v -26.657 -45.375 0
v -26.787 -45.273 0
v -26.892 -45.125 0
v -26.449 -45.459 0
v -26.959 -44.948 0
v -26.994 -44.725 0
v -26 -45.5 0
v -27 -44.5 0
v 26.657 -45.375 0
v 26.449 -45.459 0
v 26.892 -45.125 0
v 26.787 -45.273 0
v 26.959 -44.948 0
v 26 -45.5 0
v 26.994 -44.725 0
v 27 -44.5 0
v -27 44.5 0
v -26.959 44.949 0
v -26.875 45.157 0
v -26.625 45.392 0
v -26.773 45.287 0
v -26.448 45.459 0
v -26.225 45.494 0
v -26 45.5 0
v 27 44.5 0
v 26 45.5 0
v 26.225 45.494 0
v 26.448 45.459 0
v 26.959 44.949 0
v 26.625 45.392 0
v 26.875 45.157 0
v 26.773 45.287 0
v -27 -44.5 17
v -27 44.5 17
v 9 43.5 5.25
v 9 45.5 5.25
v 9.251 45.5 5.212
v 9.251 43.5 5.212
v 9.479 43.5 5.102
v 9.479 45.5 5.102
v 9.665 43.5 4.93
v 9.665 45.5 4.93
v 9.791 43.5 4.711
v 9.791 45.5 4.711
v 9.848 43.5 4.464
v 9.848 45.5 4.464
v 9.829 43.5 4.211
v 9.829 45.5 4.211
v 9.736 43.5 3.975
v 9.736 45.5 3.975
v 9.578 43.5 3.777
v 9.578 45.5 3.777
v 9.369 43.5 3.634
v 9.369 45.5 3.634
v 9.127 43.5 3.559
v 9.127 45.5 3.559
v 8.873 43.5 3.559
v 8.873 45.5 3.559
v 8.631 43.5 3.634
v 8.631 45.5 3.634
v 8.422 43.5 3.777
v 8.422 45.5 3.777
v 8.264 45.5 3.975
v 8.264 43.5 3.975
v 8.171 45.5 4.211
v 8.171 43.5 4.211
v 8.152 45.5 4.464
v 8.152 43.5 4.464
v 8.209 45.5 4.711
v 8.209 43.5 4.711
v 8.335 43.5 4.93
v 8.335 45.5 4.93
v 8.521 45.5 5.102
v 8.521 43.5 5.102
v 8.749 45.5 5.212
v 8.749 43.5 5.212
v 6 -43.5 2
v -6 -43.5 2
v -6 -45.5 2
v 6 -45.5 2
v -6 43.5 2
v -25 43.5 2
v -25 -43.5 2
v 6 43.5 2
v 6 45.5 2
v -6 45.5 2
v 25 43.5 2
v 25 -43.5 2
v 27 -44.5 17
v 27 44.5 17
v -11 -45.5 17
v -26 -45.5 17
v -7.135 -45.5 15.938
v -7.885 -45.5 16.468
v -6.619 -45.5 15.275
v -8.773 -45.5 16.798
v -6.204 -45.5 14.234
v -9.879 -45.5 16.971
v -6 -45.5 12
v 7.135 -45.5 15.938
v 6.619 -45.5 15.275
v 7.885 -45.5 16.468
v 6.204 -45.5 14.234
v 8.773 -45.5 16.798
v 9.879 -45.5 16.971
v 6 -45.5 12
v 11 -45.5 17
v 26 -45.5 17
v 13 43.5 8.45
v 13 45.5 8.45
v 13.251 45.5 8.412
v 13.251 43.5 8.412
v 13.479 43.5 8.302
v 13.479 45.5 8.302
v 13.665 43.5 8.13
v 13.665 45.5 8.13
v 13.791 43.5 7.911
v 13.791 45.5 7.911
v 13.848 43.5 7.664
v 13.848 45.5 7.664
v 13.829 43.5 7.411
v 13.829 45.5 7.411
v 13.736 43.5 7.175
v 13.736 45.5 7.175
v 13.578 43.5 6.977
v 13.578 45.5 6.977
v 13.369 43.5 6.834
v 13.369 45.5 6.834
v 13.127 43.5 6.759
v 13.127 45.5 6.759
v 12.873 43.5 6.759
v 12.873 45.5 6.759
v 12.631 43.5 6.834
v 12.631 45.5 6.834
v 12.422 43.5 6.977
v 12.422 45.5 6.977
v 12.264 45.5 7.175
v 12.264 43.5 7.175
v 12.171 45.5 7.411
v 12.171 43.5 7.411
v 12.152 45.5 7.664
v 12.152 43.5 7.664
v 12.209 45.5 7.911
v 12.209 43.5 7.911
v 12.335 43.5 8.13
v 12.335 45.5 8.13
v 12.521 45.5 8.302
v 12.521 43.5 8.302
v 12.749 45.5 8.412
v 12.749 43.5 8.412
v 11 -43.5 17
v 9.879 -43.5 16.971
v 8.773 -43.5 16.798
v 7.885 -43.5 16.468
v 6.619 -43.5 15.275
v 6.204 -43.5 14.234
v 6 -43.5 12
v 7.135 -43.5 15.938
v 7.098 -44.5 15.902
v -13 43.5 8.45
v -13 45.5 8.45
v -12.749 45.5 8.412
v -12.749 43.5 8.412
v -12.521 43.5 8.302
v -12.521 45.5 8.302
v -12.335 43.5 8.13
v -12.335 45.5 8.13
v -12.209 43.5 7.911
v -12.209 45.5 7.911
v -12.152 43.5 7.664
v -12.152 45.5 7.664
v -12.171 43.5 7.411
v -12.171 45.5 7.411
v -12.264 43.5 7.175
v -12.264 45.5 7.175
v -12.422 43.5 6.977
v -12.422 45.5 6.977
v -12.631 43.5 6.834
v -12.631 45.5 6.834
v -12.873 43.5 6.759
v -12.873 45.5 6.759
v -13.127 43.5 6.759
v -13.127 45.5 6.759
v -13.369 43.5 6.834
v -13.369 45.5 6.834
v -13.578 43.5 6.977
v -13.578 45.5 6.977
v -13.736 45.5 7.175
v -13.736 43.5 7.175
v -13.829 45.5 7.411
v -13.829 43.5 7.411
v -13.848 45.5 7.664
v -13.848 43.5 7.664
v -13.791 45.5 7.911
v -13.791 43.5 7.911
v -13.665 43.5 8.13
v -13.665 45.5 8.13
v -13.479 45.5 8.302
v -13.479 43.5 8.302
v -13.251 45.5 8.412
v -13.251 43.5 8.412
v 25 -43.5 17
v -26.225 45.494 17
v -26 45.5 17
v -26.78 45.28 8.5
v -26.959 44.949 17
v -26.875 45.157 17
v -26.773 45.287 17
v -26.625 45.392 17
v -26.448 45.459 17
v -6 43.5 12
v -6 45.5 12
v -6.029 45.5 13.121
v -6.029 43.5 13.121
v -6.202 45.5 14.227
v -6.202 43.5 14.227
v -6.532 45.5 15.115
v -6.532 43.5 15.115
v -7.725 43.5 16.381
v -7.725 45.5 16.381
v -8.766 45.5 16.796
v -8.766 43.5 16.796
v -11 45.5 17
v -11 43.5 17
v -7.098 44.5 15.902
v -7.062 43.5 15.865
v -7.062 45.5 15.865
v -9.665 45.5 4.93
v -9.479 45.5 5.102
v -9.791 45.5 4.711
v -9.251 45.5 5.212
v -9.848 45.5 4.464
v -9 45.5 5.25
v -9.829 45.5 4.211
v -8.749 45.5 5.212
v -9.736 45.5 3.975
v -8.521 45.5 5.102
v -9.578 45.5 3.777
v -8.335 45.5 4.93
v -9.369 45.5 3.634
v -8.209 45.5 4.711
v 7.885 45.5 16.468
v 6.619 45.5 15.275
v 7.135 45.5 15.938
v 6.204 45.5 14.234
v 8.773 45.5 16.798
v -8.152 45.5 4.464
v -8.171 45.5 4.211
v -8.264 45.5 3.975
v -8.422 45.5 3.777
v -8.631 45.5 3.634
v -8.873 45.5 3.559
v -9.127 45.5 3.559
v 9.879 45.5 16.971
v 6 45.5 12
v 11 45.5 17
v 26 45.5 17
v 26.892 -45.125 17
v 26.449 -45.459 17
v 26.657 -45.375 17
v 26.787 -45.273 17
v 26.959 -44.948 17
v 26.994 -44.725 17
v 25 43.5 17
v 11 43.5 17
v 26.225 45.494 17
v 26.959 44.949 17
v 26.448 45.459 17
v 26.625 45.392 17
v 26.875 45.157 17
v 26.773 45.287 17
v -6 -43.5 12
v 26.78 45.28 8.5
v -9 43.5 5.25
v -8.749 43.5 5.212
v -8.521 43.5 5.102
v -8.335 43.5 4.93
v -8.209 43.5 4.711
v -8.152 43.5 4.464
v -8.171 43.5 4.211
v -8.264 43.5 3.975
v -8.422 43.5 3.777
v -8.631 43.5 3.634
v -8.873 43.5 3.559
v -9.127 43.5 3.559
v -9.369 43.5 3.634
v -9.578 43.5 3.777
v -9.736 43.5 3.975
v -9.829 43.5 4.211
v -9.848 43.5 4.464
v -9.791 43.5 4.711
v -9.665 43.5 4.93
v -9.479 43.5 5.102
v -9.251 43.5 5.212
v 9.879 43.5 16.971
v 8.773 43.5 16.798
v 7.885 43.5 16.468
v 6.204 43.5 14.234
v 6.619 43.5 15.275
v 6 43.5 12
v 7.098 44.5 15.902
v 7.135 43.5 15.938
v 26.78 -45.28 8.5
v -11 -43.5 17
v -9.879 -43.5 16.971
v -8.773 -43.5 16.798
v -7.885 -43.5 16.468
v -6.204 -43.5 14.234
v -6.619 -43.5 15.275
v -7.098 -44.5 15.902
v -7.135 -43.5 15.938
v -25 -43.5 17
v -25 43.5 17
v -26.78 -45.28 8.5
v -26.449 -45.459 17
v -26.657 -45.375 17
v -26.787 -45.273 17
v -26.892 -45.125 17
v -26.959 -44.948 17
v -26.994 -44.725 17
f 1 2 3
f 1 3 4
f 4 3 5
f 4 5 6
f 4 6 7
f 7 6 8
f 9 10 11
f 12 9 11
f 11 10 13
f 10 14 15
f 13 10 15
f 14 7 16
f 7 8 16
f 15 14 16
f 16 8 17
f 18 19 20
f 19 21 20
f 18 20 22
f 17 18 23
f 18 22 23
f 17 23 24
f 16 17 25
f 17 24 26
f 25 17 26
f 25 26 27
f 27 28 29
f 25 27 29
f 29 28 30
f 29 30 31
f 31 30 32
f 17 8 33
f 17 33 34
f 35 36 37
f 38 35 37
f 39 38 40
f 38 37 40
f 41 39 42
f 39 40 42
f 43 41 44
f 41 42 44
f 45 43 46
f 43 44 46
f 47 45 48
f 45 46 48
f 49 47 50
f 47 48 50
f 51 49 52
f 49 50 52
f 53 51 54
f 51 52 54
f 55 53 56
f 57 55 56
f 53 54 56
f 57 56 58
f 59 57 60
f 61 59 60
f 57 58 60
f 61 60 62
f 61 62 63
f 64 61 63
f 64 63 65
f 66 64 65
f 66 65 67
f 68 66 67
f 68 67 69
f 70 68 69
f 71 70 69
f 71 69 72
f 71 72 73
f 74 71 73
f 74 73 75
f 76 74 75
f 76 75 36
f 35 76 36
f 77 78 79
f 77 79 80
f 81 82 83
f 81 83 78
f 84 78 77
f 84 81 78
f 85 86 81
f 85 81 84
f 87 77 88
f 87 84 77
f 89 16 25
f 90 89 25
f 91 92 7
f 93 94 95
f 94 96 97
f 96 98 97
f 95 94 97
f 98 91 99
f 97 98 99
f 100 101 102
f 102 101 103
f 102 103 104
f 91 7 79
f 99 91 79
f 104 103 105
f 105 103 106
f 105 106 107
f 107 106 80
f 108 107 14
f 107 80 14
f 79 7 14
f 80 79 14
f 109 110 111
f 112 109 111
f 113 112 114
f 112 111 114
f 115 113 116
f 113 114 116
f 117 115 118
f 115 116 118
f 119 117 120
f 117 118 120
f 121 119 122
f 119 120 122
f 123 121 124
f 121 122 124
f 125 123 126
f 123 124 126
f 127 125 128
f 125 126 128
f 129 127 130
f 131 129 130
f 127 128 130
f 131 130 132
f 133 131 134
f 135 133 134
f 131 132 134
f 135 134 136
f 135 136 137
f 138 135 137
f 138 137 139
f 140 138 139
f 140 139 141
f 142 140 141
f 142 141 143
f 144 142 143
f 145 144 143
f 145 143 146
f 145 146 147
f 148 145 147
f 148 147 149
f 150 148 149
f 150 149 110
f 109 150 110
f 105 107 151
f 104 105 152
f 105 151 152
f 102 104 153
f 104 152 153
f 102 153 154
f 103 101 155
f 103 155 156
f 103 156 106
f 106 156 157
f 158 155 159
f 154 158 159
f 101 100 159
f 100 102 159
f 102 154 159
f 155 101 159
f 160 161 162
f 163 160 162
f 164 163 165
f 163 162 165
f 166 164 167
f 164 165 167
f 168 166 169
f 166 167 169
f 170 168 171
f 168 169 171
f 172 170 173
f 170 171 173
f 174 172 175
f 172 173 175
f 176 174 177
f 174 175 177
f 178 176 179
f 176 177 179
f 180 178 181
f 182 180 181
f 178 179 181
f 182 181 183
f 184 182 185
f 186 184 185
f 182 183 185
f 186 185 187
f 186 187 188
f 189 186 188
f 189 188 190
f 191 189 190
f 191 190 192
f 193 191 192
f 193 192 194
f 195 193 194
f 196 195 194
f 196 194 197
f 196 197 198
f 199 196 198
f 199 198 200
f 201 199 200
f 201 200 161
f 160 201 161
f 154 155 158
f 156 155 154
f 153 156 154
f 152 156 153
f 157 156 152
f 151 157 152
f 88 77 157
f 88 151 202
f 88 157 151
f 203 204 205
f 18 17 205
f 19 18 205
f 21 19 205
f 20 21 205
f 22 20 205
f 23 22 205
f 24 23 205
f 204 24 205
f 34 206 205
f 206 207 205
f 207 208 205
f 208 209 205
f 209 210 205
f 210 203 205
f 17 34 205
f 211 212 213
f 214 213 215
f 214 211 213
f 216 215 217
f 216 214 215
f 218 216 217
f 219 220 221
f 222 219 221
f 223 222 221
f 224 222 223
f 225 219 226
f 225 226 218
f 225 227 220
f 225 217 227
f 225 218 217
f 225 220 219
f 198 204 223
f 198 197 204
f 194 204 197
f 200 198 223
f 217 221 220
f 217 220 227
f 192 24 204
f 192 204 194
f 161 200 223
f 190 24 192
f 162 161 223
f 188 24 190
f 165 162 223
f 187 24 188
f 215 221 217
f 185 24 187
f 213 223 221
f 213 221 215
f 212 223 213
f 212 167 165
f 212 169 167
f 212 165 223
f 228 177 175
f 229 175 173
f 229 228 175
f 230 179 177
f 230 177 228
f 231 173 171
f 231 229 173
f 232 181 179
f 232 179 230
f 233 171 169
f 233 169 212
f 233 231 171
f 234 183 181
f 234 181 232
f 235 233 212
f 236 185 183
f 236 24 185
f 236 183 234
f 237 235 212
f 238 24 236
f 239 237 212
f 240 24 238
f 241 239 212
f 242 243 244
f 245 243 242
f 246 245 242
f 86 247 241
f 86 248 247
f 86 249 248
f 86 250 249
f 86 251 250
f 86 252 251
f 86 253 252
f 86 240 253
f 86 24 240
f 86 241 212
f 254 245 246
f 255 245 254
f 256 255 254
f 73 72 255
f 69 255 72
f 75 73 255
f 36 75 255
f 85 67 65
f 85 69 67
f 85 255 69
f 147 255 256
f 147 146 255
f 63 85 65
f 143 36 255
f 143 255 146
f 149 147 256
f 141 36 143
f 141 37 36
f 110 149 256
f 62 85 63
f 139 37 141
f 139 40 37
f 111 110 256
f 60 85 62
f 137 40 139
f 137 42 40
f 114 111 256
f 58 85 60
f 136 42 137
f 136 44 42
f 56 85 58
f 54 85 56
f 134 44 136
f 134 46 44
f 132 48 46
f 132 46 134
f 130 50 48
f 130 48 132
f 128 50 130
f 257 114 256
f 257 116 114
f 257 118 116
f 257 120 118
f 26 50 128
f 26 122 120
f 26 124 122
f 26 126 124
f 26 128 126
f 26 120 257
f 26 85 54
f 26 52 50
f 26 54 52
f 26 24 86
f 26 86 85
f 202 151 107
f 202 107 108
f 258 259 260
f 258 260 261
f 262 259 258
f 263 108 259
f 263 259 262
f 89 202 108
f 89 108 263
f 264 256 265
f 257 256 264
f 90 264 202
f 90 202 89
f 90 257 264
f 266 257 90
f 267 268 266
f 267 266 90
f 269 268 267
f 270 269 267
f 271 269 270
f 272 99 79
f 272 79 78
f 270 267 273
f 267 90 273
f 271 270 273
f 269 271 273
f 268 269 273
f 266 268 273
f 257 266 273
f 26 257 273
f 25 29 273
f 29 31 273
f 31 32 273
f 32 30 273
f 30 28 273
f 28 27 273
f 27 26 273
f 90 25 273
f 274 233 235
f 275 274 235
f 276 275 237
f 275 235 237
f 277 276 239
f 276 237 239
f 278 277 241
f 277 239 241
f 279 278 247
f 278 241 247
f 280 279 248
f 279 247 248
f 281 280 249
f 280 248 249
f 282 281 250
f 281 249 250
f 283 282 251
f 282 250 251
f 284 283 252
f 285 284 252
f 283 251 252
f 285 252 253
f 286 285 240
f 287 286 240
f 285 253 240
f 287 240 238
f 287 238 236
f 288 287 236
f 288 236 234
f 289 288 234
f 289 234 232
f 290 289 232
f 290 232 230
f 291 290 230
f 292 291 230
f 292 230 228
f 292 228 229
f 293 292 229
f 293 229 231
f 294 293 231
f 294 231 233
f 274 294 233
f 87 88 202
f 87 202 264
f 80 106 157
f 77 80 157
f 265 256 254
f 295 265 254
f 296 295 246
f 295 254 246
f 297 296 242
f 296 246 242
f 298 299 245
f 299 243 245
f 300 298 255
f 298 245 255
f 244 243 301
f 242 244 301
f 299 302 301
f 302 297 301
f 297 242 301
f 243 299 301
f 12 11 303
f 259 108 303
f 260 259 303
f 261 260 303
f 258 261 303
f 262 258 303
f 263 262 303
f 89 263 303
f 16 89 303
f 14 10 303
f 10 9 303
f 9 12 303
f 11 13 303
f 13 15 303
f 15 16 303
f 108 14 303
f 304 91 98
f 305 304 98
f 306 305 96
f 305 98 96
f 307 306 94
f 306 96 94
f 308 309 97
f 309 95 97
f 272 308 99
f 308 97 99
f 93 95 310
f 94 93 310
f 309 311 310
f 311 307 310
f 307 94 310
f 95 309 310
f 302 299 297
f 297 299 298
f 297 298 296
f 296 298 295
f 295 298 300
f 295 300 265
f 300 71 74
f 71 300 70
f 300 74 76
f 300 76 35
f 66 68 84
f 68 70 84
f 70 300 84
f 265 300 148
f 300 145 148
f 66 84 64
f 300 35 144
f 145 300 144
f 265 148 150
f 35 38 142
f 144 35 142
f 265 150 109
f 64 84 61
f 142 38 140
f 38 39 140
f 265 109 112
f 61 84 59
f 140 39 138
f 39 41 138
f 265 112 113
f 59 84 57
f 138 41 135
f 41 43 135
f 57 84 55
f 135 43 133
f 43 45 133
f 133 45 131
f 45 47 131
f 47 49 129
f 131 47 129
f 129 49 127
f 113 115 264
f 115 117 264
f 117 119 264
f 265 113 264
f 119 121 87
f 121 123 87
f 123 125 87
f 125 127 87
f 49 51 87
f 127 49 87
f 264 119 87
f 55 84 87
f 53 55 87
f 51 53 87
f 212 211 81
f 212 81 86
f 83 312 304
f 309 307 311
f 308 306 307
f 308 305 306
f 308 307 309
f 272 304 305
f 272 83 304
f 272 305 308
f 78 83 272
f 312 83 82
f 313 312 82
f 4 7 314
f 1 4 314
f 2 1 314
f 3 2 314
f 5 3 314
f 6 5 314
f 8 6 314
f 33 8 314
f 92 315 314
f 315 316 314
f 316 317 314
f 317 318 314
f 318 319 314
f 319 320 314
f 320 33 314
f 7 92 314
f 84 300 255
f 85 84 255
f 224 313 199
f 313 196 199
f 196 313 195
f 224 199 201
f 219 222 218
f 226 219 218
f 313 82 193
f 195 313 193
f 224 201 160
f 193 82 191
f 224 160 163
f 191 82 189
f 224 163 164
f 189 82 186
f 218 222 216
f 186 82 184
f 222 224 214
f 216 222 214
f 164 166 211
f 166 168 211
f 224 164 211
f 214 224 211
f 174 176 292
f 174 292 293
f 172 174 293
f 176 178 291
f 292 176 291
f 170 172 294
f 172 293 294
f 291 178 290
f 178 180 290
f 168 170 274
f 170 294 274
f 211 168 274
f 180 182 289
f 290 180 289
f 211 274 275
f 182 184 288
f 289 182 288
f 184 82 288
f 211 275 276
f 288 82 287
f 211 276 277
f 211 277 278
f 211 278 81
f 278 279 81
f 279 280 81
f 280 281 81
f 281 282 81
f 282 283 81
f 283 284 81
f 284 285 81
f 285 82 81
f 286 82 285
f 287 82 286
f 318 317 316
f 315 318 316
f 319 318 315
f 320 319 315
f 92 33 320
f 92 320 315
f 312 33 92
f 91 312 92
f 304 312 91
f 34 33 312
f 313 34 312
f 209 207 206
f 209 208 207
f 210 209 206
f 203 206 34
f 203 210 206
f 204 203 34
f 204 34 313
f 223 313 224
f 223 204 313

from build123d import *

# Parameters (mm, degrees)
SKETCH_1_W          = 54
SKETCH_1_H          = 91
SKETCH_1_W_2        = 50
SKETCH_1_H_2        = 87
EXTRUDE_1_DEPTH     = 17
SKETCH_2_W          = 54
SKETCH_2_H          = 91
EXTRUDE_2_DEPTH     = 2
SKETCH_3_W          = 12
SKETCH_3_H          = 98.630911944
CUT_EXTRUDE_1_DEPTH = 15
SKETCH_5_R          = 0.85
CUT_EXTRUDE_2_DEPTH = 11
FILLET_1_SIZE       = 1
FILLET_2_SIZE       = 5


with BuildPart() as part:
    # 草图1 → 凸台-拉伸1 (new body)
    with BuildSketch(Plane.XY):
        Rectangle(SKETCH_1_W, SKETCH_1_H)
        Rectangle(SKETCH_1_W_2, SKETCH_1_H_2, mode=Mode.SUBTRACT)
    extrude(amount=EXTRUDE_1_DEPTH)

    # 草图2 → 凸台-拉伸2 (add)
    with BuildSketch(Plane(origin=(0, 0, 0), x_dir=(-1, 0, 0), z_dir=(0, 0, -1))):
        Rectangle(SKETCH_2_W, SKETCH_2_H)
    extrude(amount=-EXTRUDE_2_DEPTH)

    # 草图3 → 切除-拉伸1 (cut)
    with BuildSketch(Plane.XY.offset(17)):
        Rectangle(SKETCH_3_W, SKETCH_3_H)
    extrude(amount=-CUT_EXTRUDE_1_DEPTH, mode=Mode.SUBTRACT)

    # 草图5 → 切除-拉伸2 (cut)
    with BuildSketch(Plane(origin=(0, 45.5, 0), x_dir=(1, 0, 0), z_dir=(0, 1, 0))):
        with Locations(Location((-9, -4.4, 0), (0, 0, 270))):
            Circle(SKETCH_5_R)
        with Locations(Location((-13, -7.6, 0), (0, 0, 270))):
            Circle(SKETCH_5_R)
        with Locations(Location((9, -4.4, 0), (0, 0, 270))):
            Circle(SKETCH_5_R)
        with Locations(Location((13, -7.6, 0), (0, 0, 270))):
            Circle(SKETCH_5_R)
    extrude(amount=-CUT_EXTRUDE_2_DEPTH, mode=Mode.SUBTRACT)

    # 圆角1
    # a fillet whose section is not a circle: 1 mm, written as the material it takes off along each edge
    with BuildSketch(Plane(origin=(-27, -45.5, -2.5), x_dir=(0, 1, 0), z_dir=(0, 0, 1)), Plane(origin=(27, -45.5, 19.5), x_dir=(0, 1, 0), z_dir=(0, 0, -1)), Plane(origin=(27, 45.5, 19.5), x_dir=(-1, 0, 0), z_dir=(0, 0, -1)), Plane(origin=(-27, 45.5, -2.5), x_dir=(1, 0, 0), z_dir=(0, 0, 1))) as fillet_1_piece_1:
        with BuildLine():
            add(Edge.make_bspline([(FILLET_1_SIZE, 0), (FILLET_1_SIZE * 0.831801948466, 0), (FILLET_1_SIZE * 0.663603896932, 0), (FILLET_1_SIZE * 0.292893218813, -FILLET_1_SIZE * 0.0716919198361), (FILLET_1_SIZE * 0.0716919198361, -FILLET_1_SIZE * 0.292893218813), (0, -FILLET_1_SIZE * 0.663603896932), (0, -FILLET_1_SIZE * 0.831801948466), (0, -FILLET_1_SIZE)], knots=[0, 0, 0, 0, 0, 0, 0.5, 0.5, 1, 1, 1, 1, 1, 1], degree=5))
            Line((0, -FILLET_1_SIZE), (0, 0))
            Line((0, 0), (FILLET_1_SIZE, 0))
        make_face()
    extrude(amount=22, mode=Mode.SUBTRACT)

    # 圆角2
    # a fillet whose section is not a circle: 5 mm, written as the material it takes off along each edge
    with BuildSketch(Plane(origin=(6, -31, 17), x_dir=(1, 0, 0), z_dir=(0, -1, 0)), Plane(origin=(-6, -58, 17), x_dir=(-1, 0, 0), z_dir=(0, 1, 0)), Plane(origin=(6, 58, 17), x_dir=(1, 0, 0), z_dir=(0, -1, 0))) as fillet_2_piece_1:
        with BuildLine():
            add(Edge.make_bspline([(FILLET_2_SIZE, 0), (FILLET_2_SIZE * 0.831801948466, 0), (FILLET_2_SIZE * 0.663603896932, 0), (FILLET_2_SIZE * 0.292893218813, -FILLET_2_SIZE * 0.0716919198361), (FILLET_2_SIZE * 0.0716919198361, -FILLET_2_SIZE * 0.292893218813), (0, -FILLET_2_SIZE * 0.663603896932), (0, -FILLET_2_SIZE * 0.831801948466), (0, -FILLET_2_SIZE)], knots=[0, 0, 0, 0, 0, 0, 0.5, 0.5, 1, 1, 1, 1, 1, 1], degree=5))
            Line((0, -FILLET_2_SIZE), (0, 0))
            Line((0, 0), (FILLET_2_SIZE, 0))
        make_face()
    extrude(amount=27, mode=Mode.SUBTRACT)
    with BuildSketch(Plane(origin=(-6, 31, 17), x_dir=(0, 0, -1), z_dir=(0, 1, 0))) as fillet_2_piece_2:
        with BuildLine():
            add(Edge.make_bspline([(FILLET_2_SIZE, 0), (FILLET_2_SIZE * 0.831801948466, 0), (FILLET_2_SIZE * 0.663603896932, 0), (FILLET_2_SIZE * 0.292893218813, FILLET_2_SIZE * 0.0716919198361), (FILLET_2_SIZE * 0.0716919198361, FILLET_2_SIZE * 0.292893218813), (0, FILLET_2_SIZE * 0.663603896932), (0, FILLET_2_SIZE * 0.831801948466), (0, FILLET_2_SIZE)], knots=[0, 0, 0, 0, 0, 0, 0.5, 0.5, 1, 1, 1, 1, 1, 1], degree=5))
            Line((0, FILLET_2_SIZE), (0, 0))
            Line((0, 0), (FILLET_2_SIZE, 0))
        make_face()
    extrude(amount=27, mode=Mode.SUBTRACT)


solid = part.part
